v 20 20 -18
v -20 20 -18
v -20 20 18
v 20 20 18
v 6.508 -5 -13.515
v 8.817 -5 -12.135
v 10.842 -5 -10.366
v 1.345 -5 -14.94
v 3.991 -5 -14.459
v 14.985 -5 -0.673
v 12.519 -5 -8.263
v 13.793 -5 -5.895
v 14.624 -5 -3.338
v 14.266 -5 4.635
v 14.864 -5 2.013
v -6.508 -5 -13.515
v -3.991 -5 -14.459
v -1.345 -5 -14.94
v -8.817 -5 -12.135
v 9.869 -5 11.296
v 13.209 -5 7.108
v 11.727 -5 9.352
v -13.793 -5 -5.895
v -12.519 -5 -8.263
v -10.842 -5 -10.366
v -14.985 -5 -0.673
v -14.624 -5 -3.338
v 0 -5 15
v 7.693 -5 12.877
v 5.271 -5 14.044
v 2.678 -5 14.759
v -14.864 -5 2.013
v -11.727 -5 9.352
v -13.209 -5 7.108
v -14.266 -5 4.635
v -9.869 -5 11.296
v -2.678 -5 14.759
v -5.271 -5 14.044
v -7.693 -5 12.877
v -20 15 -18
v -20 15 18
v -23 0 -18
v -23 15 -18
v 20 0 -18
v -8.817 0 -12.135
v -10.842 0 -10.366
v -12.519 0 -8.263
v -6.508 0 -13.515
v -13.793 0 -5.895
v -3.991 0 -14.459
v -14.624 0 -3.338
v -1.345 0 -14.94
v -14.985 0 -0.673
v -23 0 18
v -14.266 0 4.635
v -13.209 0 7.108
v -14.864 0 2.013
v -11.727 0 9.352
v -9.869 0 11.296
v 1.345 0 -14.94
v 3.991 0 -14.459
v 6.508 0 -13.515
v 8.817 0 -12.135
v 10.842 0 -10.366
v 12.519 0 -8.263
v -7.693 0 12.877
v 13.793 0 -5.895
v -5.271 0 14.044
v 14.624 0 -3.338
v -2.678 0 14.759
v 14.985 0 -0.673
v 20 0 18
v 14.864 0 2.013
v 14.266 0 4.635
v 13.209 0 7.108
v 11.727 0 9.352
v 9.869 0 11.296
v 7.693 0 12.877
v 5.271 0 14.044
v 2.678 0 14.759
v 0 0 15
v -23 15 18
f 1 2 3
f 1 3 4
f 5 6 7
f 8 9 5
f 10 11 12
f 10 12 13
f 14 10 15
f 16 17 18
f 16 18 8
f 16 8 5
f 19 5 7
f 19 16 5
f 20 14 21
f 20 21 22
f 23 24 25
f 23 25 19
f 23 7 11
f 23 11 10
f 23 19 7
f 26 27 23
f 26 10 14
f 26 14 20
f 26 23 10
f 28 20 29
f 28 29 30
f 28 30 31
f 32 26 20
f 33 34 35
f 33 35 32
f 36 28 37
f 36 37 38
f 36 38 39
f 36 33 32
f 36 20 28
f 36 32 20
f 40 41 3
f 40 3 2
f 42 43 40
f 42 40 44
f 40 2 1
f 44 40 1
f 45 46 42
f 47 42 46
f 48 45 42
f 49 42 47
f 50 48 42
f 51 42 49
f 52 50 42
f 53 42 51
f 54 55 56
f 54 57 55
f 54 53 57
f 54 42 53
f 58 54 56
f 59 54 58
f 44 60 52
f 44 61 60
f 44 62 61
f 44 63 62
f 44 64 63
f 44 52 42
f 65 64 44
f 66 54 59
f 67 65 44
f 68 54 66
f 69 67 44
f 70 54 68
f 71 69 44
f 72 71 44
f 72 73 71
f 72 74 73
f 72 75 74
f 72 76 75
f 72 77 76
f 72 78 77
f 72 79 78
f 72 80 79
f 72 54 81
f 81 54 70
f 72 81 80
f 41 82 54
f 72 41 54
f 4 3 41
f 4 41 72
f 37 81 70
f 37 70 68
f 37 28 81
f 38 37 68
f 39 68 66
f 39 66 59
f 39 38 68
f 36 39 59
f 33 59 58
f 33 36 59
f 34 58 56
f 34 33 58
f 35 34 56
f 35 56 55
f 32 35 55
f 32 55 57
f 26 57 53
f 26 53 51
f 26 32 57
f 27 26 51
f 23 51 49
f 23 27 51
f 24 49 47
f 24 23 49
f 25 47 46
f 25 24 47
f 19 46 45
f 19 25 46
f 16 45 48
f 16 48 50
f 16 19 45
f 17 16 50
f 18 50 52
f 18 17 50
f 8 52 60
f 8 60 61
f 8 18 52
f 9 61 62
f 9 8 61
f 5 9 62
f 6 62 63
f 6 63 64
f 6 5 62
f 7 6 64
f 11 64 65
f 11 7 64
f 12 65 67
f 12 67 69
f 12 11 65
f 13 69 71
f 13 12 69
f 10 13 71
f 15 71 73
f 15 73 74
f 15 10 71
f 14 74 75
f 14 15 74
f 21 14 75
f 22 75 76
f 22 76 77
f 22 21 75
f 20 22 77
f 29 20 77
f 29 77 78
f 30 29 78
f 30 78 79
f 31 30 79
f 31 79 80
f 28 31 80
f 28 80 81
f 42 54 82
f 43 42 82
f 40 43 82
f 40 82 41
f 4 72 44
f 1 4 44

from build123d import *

# Parameters (mm, degrees)
CROQUIS1_W                   = 40
CROQUIS1_H                   = 36
SALIENTE_EXTRUIR1_DEPTH      = 20
CROQUIS3_W                   = 3
CROQUIS3_H                   = 15
SALIENTE_EXTRUIR2_DEPTH      = 18
SALIENTE_EXTRUIR2_DEPTH_BACK = 18


with BuildPart() as part:
    # Croquis1 → Saliente-Extruir1 (new body)
    with BuildSketch(Plane(origin=(0, 0, 0), x_dir=(1, 0, 0), z_dir=(0, 1, 0))):
        Rectangle(CROQUIS1_W, CROQUIS1_H)
    extrude(amount=SALIENTE_EXTRUIR1_DEPTH)

    # Croquis2 → Revolución1 (revolve)
    with BuildSketch(Plane(origin=(0, 0, 0), x_dir=(0, 0, -1), z_dir=(1, 0, 0))):
        Polygon((0, 0), (-15, 1.022668877), (-15, -5), (0, -5), align=None)
    revolve(axis=Axis((0, 0, 0), (0, -1, 0)))

    # Croquis3 → Saliente-Extruir2 (add, two sides)
    with BuildSketch(Plane.XY) as saliente_extruir2_sk:
        with Locations((-21.5, 7.5)):
            Rectangle(CROQUIS3_W, CROQUIS3_H)
    extrude(amount=SALIENTE_EXTRUIR2_DEPTH)
    extrude(saliente_extruir2_sk.sketch, amount=-SALIENTE_EXTRUIR2_DEPTH_BACK)


solid = part.part
